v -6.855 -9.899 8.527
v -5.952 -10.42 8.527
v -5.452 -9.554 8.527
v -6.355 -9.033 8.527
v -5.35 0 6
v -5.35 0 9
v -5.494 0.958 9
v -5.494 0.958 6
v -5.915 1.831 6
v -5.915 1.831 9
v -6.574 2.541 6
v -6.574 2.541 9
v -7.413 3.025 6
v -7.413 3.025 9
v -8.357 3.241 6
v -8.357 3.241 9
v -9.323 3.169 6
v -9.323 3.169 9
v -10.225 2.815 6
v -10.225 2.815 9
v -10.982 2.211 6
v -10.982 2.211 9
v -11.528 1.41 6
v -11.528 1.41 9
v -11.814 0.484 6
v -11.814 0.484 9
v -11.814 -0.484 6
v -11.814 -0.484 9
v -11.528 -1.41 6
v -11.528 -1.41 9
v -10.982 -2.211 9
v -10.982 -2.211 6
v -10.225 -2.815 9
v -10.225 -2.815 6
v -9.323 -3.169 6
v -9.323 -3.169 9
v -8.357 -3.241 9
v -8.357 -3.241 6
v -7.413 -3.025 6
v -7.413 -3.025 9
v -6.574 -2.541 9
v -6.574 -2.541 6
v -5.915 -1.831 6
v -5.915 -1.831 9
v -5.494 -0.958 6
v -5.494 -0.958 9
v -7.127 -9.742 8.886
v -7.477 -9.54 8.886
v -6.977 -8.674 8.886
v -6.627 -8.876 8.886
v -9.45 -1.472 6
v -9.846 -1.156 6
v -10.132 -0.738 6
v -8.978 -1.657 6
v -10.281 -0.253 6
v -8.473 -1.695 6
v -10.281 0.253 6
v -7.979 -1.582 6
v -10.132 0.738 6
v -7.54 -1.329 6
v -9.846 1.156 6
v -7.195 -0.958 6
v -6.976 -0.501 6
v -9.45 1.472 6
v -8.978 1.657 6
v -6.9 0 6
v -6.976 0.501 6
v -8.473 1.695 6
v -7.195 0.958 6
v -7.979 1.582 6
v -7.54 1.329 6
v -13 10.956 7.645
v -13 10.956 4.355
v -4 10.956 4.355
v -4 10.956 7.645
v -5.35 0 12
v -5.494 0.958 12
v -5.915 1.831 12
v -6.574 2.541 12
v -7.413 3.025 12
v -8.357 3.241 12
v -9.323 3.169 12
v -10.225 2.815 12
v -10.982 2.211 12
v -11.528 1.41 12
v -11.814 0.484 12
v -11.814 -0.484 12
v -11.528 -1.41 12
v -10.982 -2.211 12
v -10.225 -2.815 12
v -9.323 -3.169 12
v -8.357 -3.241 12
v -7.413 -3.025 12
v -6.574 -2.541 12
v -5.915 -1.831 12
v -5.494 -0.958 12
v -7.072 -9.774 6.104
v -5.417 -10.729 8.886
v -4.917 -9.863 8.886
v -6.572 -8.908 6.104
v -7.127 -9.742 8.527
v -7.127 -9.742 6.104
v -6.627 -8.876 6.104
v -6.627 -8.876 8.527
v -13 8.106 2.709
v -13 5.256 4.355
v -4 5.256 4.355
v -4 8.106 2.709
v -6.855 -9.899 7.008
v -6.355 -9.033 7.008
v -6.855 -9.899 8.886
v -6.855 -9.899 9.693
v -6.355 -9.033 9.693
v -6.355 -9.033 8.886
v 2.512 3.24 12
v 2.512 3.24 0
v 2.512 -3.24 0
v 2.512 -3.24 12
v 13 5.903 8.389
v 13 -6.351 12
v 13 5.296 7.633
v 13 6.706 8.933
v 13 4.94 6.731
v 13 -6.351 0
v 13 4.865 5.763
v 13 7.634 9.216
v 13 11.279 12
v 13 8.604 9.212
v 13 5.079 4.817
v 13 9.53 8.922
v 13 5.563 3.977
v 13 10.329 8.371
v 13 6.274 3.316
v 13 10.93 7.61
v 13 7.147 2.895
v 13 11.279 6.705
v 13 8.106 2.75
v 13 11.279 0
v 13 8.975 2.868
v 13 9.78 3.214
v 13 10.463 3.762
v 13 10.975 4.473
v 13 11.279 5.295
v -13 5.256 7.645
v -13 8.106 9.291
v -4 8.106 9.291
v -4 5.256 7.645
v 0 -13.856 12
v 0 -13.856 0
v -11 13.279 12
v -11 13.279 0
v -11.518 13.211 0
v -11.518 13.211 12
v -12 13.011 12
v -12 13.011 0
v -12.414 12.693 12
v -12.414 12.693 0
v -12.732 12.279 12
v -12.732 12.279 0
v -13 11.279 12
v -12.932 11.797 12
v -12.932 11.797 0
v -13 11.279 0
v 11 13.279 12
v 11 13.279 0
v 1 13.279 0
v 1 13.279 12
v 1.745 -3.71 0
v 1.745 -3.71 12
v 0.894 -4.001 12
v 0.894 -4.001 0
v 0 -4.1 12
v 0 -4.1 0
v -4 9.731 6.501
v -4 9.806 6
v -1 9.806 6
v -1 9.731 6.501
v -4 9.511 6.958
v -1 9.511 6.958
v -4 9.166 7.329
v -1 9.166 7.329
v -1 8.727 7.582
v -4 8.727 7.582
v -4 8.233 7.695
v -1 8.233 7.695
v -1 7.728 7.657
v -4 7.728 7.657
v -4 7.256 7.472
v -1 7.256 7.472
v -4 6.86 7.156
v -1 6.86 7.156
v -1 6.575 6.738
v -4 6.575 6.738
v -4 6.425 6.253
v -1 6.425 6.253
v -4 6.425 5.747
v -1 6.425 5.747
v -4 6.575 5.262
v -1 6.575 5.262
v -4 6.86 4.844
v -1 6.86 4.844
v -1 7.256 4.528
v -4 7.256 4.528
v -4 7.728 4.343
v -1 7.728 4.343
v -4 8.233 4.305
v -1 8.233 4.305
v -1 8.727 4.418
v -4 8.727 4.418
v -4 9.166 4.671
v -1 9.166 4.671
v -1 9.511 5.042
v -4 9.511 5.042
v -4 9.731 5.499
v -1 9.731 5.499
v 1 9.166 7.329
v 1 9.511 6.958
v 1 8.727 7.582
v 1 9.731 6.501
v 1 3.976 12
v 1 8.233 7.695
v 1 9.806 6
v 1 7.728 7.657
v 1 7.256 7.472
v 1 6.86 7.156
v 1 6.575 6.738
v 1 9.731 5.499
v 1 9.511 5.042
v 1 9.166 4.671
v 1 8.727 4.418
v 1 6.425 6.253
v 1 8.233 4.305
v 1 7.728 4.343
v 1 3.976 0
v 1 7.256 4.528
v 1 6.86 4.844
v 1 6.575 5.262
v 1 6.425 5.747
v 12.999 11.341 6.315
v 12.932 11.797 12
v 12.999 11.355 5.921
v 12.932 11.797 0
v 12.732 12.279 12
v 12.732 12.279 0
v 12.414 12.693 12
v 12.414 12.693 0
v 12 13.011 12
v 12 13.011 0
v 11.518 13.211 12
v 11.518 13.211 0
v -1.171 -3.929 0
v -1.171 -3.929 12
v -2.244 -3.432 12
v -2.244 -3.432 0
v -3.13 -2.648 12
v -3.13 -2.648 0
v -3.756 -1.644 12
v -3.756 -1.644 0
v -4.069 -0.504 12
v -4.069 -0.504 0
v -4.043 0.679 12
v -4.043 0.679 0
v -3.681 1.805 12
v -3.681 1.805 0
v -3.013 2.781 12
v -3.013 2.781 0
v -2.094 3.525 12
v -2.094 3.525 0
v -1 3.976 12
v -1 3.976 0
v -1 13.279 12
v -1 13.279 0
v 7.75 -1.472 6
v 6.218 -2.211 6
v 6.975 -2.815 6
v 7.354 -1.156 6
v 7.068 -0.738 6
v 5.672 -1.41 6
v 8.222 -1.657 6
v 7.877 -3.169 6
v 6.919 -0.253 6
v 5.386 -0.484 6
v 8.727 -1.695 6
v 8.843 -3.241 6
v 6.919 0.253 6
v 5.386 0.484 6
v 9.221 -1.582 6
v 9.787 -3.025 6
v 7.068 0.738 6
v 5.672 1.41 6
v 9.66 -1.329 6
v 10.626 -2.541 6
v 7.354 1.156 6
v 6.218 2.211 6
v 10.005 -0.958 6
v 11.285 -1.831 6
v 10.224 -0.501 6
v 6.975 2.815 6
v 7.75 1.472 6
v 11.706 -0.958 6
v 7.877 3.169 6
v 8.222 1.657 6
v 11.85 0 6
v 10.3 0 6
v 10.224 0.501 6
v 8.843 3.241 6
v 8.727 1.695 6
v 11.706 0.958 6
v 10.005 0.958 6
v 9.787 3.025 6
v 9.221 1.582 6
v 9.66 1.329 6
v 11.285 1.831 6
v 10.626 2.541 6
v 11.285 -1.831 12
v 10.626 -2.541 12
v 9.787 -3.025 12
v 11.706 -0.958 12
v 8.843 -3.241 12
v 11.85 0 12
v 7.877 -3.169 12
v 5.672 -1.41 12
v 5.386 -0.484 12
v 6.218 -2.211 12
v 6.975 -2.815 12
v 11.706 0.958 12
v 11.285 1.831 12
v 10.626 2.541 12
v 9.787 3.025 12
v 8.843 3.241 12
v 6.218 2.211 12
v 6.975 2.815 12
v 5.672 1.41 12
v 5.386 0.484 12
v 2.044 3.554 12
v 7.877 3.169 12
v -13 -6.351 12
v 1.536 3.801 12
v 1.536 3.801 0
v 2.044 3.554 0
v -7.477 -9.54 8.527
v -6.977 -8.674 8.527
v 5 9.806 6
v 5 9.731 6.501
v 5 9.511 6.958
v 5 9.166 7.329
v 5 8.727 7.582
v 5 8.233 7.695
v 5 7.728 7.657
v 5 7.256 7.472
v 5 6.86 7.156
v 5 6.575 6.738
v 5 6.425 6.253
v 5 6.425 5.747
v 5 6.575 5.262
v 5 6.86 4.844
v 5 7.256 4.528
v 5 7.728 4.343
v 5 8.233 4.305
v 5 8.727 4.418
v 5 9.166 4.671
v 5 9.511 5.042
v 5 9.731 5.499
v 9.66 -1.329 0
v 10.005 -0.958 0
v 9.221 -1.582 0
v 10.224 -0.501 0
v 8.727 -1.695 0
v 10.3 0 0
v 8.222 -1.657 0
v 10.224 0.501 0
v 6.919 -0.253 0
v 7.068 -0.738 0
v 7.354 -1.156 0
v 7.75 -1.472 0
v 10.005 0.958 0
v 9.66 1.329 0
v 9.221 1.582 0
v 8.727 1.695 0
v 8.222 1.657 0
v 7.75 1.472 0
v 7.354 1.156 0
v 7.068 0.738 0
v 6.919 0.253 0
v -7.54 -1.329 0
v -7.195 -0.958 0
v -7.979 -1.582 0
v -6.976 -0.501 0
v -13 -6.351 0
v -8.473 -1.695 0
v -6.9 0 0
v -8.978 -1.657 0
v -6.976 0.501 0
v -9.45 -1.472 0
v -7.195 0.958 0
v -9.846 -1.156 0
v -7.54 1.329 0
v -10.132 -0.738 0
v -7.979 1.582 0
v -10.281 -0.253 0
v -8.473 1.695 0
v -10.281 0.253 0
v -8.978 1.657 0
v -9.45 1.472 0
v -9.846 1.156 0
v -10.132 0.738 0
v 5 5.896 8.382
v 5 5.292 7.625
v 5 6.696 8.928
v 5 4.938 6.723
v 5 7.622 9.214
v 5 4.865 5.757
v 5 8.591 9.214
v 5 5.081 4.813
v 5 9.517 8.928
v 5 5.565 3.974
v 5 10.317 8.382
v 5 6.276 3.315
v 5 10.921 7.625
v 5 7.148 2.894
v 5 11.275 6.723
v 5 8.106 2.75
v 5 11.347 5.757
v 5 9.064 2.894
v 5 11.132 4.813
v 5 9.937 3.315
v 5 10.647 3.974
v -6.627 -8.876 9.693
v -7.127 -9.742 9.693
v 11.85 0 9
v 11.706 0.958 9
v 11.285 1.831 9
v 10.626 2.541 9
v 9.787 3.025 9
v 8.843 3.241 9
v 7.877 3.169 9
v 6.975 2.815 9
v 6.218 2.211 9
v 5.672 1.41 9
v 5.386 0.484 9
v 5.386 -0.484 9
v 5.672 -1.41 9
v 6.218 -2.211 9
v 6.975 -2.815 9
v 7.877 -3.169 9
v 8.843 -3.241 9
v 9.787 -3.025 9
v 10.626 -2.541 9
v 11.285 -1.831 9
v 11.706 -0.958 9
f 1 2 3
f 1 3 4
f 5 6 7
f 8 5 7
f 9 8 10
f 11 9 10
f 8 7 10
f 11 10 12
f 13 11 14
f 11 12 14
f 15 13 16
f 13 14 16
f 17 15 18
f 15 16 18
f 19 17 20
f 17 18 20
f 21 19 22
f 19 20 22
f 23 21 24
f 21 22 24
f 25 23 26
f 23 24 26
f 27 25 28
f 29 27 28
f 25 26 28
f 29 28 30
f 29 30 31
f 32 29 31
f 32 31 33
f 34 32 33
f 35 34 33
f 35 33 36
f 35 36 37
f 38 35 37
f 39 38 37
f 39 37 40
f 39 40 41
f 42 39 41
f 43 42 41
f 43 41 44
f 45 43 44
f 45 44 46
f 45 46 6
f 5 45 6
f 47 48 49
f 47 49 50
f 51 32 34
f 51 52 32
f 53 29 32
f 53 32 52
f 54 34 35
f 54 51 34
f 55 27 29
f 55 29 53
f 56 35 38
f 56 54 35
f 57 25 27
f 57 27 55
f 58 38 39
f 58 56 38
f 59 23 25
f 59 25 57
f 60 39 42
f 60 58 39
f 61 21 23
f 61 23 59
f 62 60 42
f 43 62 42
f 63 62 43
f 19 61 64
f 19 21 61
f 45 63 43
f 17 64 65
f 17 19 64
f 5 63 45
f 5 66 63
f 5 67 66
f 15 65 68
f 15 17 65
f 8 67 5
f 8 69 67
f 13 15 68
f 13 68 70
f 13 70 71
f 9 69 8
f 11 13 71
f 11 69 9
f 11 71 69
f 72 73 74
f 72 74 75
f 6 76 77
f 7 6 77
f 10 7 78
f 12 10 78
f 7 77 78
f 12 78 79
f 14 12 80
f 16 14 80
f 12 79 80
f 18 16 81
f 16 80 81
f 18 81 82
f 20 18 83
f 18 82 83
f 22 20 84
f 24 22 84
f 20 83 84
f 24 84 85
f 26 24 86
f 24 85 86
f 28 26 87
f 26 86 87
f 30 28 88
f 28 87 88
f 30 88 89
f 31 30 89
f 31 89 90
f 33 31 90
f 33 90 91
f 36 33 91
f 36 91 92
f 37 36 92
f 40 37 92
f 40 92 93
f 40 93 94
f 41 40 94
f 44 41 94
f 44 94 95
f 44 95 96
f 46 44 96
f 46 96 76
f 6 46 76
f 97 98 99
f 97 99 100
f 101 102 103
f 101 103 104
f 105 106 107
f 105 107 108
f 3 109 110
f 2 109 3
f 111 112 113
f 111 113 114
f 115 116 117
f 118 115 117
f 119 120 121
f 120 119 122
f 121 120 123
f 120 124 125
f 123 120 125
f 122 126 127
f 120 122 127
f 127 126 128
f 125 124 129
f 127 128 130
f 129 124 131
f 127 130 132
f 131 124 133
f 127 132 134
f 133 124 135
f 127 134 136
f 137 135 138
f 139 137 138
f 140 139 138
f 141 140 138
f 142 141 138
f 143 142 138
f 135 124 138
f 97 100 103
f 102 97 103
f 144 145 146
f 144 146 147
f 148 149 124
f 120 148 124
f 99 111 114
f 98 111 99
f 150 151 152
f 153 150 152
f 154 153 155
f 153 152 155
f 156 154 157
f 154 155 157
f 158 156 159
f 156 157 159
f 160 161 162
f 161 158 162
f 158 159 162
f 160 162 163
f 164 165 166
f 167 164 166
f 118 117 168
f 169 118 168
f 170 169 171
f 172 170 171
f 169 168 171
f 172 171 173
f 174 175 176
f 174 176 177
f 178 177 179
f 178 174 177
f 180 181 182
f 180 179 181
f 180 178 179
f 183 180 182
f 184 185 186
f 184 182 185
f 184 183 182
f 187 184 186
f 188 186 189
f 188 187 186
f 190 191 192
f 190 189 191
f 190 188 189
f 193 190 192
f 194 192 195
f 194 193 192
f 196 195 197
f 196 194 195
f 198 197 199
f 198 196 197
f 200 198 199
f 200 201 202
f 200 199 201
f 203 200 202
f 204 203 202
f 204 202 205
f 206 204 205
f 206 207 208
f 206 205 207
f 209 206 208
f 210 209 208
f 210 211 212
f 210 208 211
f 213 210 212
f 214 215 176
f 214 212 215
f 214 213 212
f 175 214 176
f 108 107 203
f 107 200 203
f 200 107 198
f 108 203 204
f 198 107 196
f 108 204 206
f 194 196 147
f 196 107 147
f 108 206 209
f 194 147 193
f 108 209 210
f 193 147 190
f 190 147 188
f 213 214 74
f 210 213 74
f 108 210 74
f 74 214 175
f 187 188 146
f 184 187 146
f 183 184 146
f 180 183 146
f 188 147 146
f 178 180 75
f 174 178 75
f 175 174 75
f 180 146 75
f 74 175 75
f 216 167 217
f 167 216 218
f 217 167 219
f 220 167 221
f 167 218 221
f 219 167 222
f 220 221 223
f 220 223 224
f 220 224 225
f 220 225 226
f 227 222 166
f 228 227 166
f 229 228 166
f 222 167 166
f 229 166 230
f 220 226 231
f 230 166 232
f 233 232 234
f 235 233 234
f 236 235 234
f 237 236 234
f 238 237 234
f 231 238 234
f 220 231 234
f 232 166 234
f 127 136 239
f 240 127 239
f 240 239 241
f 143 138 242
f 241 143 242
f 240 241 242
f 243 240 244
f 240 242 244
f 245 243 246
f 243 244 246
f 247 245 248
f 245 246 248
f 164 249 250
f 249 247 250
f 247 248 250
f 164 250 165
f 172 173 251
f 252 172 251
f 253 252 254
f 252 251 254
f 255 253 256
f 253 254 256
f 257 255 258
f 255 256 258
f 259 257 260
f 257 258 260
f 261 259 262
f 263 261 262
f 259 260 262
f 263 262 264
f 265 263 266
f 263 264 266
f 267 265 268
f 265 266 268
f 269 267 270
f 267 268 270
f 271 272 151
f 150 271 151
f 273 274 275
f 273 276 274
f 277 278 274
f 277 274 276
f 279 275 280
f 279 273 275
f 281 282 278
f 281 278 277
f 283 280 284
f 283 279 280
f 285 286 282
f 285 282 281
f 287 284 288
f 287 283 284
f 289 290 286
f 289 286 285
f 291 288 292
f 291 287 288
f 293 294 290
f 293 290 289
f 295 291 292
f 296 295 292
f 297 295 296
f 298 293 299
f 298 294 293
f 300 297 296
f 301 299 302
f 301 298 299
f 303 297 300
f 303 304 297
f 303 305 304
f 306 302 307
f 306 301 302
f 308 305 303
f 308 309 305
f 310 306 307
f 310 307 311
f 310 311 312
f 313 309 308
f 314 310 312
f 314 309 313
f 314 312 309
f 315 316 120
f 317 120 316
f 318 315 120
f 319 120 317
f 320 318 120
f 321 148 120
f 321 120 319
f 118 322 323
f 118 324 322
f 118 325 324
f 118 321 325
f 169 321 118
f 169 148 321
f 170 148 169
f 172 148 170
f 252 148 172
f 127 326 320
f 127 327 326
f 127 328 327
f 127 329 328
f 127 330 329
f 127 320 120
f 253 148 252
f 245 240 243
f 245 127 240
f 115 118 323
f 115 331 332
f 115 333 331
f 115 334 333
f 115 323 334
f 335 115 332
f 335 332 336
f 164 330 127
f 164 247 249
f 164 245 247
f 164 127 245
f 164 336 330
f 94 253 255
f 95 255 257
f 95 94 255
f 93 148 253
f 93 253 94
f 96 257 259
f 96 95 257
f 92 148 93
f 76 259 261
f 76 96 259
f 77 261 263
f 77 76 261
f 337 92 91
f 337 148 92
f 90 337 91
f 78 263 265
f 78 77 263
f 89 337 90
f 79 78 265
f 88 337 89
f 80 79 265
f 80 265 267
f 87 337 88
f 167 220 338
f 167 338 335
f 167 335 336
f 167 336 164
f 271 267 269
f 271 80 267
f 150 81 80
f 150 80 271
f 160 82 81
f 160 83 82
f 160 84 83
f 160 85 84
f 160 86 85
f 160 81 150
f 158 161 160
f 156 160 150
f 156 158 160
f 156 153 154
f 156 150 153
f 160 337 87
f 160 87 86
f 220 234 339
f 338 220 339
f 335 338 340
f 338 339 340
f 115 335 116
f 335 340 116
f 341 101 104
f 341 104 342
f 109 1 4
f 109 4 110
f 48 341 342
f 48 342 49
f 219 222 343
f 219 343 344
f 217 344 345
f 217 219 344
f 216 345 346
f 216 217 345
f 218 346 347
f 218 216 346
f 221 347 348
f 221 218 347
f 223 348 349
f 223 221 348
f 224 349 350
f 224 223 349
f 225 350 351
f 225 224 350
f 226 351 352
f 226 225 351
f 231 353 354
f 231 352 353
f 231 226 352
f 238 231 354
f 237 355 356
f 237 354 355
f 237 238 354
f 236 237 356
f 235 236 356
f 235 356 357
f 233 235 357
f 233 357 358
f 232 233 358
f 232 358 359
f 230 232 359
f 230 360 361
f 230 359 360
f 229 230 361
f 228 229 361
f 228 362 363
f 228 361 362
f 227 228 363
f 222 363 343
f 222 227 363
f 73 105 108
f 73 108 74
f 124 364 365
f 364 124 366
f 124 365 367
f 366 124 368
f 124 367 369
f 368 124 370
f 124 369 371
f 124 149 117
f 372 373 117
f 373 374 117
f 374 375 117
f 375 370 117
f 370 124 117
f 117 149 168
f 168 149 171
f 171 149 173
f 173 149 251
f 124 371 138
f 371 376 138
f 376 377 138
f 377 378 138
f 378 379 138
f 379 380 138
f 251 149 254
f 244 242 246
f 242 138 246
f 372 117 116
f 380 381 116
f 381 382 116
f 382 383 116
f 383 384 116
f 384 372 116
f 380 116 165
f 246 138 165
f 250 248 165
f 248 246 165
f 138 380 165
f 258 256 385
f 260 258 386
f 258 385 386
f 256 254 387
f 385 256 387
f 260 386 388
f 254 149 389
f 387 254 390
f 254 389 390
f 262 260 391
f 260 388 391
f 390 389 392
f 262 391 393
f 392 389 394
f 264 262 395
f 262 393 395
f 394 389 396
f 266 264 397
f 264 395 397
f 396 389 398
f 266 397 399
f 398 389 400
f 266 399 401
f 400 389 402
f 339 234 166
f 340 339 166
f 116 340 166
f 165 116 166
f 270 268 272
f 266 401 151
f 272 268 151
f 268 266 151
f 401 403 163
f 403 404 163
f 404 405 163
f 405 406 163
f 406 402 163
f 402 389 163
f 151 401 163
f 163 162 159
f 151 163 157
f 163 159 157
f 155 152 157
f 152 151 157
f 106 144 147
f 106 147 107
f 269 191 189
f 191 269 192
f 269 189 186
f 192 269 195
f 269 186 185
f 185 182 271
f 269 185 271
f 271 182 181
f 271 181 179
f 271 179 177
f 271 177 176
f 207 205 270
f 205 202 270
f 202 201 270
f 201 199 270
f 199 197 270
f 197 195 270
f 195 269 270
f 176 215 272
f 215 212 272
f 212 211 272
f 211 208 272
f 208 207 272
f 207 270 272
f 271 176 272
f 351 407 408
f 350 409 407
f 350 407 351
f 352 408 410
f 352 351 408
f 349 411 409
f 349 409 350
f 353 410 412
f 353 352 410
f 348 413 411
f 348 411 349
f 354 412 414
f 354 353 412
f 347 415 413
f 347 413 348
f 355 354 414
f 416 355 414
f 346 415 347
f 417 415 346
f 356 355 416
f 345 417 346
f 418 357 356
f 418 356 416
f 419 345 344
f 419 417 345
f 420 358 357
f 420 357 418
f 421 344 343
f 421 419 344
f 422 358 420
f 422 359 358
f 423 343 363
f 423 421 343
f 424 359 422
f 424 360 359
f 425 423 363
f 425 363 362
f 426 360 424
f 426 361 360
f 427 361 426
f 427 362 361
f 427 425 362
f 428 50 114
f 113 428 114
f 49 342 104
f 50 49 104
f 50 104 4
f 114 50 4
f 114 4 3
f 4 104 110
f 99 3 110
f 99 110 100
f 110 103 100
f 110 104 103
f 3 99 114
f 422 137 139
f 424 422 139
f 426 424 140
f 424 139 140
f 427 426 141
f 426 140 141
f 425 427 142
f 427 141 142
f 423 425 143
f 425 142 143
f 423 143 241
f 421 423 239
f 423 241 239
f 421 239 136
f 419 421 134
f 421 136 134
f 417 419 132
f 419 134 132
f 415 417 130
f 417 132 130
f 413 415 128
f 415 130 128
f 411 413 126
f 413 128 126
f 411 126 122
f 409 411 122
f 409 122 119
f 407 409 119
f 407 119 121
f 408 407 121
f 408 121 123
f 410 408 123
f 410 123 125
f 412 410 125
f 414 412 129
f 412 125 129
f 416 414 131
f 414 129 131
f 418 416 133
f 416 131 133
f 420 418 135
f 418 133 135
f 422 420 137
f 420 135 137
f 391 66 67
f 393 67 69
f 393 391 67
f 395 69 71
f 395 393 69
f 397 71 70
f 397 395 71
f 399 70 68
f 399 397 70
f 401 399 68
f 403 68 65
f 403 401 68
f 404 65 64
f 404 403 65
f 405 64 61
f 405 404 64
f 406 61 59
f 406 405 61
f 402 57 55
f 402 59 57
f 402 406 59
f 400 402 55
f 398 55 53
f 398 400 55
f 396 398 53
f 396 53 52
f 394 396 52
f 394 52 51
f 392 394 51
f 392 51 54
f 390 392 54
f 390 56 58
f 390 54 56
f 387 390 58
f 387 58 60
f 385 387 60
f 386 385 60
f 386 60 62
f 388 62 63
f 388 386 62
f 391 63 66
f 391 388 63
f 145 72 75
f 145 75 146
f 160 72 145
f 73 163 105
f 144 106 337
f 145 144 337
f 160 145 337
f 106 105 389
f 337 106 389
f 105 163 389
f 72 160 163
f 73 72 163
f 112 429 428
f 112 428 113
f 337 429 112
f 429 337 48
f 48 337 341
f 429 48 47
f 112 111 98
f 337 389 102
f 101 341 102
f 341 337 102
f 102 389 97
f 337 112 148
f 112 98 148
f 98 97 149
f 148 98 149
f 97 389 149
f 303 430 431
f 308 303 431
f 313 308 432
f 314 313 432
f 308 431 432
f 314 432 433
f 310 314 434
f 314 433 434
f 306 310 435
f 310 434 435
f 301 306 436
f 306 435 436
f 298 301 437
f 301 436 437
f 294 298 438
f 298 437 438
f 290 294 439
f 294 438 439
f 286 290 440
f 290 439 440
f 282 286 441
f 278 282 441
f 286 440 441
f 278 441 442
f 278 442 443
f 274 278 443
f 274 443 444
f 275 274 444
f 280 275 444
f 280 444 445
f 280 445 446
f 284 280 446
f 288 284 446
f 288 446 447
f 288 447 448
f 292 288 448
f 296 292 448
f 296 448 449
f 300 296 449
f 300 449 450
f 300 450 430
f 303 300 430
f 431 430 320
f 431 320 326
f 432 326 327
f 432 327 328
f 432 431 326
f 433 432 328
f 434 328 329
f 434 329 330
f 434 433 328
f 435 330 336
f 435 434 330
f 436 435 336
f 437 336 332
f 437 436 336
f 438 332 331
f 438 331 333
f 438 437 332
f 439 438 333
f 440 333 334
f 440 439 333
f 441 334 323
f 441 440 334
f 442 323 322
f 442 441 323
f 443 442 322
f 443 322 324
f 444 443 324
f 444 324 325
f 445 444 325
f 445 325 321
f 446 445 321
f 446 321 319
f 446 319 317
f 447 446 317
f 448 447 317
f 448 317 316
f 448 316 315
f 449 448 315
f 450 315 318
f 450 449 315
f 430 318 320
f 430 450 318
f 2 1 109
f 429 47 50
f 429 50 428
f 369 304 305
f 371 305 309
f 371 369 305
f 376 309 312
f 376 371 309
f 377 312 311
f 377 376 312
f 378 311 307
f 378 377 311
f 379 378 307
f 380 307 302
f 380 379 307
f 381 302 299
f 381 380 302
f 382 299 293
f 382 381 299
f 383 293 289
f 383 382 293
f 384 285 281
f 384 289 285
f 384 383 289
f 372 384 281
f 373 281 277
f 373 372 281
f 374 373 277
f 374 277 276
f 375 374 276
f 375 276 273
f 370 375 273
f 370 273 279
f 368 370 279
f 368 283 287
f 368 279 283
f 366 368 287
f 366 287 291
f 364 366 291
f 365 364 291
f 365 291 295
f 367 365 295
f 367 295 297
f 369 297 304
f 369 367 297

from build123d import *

# Parameters (mm, degrees)
BOSS_EXTRUDE1_DEPTH            = 12
SKETCH41_R                     = 1.7
CUT_EXTRUDE7_DEPTH             = 18
CBORE_FOR_M3_SHCS1_D           = 3.4
CBORE_FOR_M3_SHCS1_CBORE_D     = 6.5
CBORE_FOR_M3_SHCS1_CBORE_DEPTH = 3
F_3DSKETCH3_START              = 9
F_3DSKETCH3_OUTLINE_R          = 3.25
F_3DSKETCH3_OUTLINE_R_2        = 1.7
F_3DSKETCH3_DEPTH              = 3
CUT_EXTRUDE10_DEPTH            = 15
CUT_EXTRUDE10_DEPTH_BACK       = 15
SKETCH52_R                     = 1.7
SKETCH58_R                     = 3.25
CUT_EXTRUDE11_DEPTH            = 8
CUT_EXTRUDE12_DEPTH            = 4
CUT_EXTRUDE12_DEPTH_BACK       = 6
FILLET1_R                      = 2
SKETCH61_R                     = 3.25
CUT_EXTRUDE13_DEPTH            = 6
CUT_EXTRUDE14_DEPTH            = 1


# Read off the part's stored shape, not the designer's step: 3DSketch3
with BuildPart() as part:
    # Sketch1 → Boss-Extrude1 (new body)
    with BuildSketch(Plane(origin=(0, 0, 0), x_dir=(0, 1, 0), z_dir=(0, 0, 1))):
        with BuildLine():
            Line((-6.350852961, -13), (13.279056191, -13))
            Line((13.279056191, -13), (13.279056191, -1))
            Line((13.279056191, -1), (3.97617907, -1))
            ThreePointArc((3.97617907, -1), (3.68648689, -1.794384131), (3.24, -2.512449004))
            Line((3.24, -2.512449004), (-3.24, -2.512449004))
            ThreePointArc((-3.24, -2.512449004), (-3.879046275, -1.327780102), (-4.1, 0))
            ThreePointArc((-4.1, 0), (-0.503818326, 4.06892702), (3.97617907, 1))
            Line((3.97617907, 1), (13.279056191, 1))
            Line((13.279056191, 1), (13.279056191, 13))
            Line((13.279056191, 13), (-6.350852961, 13))
            Line((-6.350852961, 13), (-13.856406461, 0))
            Line((-13.856406461, 0), (-6.350852961, -13))
        make_face()
    extrude(amount=BOSS_EXTRUDE1_DEPTH)

    # Sketch41 → Cut-Extrude7 (cut)
    with BuildSketch(Plane(origin=(0, 0, 0), x_dir=(0, 1, 0), z_dir=(0, 0, 1))):
        with Locations(Location((0, 8.6, 0), (0, 0, 270))):
            Circle(SKETCH41_R)
        with Locations(Location((0, -8.6, 0), (0, 0, 270))):
            Circle(SKETCH41_R)
    extrude(amount=CUT_EXTRUDE7_DEPTH, mode=Mode.SUBTRACT)

    # CBORE for M3 SHCS1 (through all)
    with Locations(Plane(origin=(-8.6, 0, 12), x_dir=(1, 0, 0), z_dir=(0, 0, 1))):
        with Locations((0, 0)):
            CounterBoreHole(CBORE_FOR_M3_SHCS1_D / 2, CBORE_FOR_M3_SHCS1_CBORE_D / 2, CBORE_FOR_M3_SHCS1_CBORE_DEPTH)

    # 3DSketch3 outline → 3DSketch3 (cut)
    with BuildSketch(Plane.XY.offset(F_3DSKETCH3_START)):
        with Locations((8.6, 0)):
            Circle(F_3DSKETCH3_OUTLINE_R)
        with Locations((8.6, 0)):
            Circle(F_3DSKETCH3_OUTLINE_R_2, mode=Mode.SUBTRACT)
    extrude(amount=F_3DSKETCH3_DEPTH, mode=Mode.SUBTRACT)

    # Sketch52 → Cut-Extrude10 (cut, two sides: drawn at the far end of the back side and taken through both)
    with BuildSketch(Plane.YZ.offset(-1).offset(-CUT_EXTRUDE10_DEPTH_BACK)):
        with Locations((8.106406461, 6)):
            Circle(SKETCH52_R)
    extrude(amount=CUT_EXTRUDE10_DEPTH + CUT_EXTRUDE10_DEPTH_BACK, mode=Mode.SUBTRACT)

    # Sketch58 → Cut-Extrude11 (cut)
    with BuildSketch(Plane.YZ.offset(13)):
        with Locations(Location((8.106406461, 6, 0), (0, 0, 270))):
            Circle(SKETCH58_R)
    extrude(amount=-CUT_EXTRUDE11_DEPTH, mode=Mode.SUBTRACT)

    # Sketch60 → Cut-Extrude12 (cut, two sides: drawn at the far end of the back side and taken through both)
    with BuildSketch(Plane.YZ.offset(-8).offset(-CUT_EXTRUDE12_DEPTH_BACK)):
        Polygon((8.106406461, 2.709103466), (10.956406461, 4.354551733), (10.956406461, 7.645448267), (8.106406461, 9.290896534), (5.256406461, 7.645448267), (5.256406461, 4.354551733), align=None)
    extrude(amount=CUT_EXTRUDE12_DEPTH + CUT_EXTRUDE12_DEPTH_BACK, mode=Mode.SUBTRACT)

    # Fillet1
    # the kernel refuses this fillet: 2 mm, written as the material it takes off along each edge
    with BuildSketch(Plane(origin=(13, 13.279056191, -5), x_dir=(0, -1, 0), z_dir=(0, 0, 1)), Plane(origin=(-13, 13.279056191, -5), x_dir=(1, 0, 0), z_dir=(0, 0, 1))) as fillet1_piece_1:
        with BuildLine():
            CenterArc((FILLET1_R, -FILLET1_R), FILLET1_R, 90, 90)
            Line((0, -FILLET1_R), (0, 0))
            Line((0, 0), (FILLET1_R, 0))
        make_face()
    extrude(amount=22, mode=Mode.SUBTRACT)

    # Sketch61 → Cut-Extrude13 (cut)
    with BuildSketch(Plane(origin=(0, 0, 12), x_dir=(0, 1, 0), z_dir=(0, 0, 1))):
        with Locations(Location((0, 8.6, 0), (0, 0, 270))):
            Circle(SKETCH61_R)
        with Locations(Location((0, -8.6, 0), (0, 0, 270))):
            Circle(SKETCH61_R)
    extrude(amount=-CUT_EXTRUDE13_DEPTH, mode=Mode.SUBTRACT)

    # Sketch62 → Cut-Extrude14 (cut)
    with BuildSketch(Plane(origin=(-6, -10.392304845, 0), x_dir=(-0.8660254037844386, 0.5000000000000001, 0), z_dir=(-0.5000000000000001, -0.8660254037844386, 0))):
        Polygon((1.237336886, -6.103727624), (1.301138969, -6.103727624), (1.301138969, -8.526804547), (1.704985123, -8.526804547), (1.704985123, -8.885778906), (1.301138969, -8.885778906), (1.301138969, -9.693471213), (0.987036405, -9.693471213), (0.987036405, -8.885778906), (-0.673220005, -8.885778906), align=None)
        Polygon((0.987036405, -8.526804547), (0.987036405, -7.008174739), (-0.055531704, -8.526804547), align=None, mode=Mode.SUBTRACT)
    extrude(amount=-CUT_EXTRUDE14_DEPTH, mode=Mode.SUBTRACT)


solid = part.part
